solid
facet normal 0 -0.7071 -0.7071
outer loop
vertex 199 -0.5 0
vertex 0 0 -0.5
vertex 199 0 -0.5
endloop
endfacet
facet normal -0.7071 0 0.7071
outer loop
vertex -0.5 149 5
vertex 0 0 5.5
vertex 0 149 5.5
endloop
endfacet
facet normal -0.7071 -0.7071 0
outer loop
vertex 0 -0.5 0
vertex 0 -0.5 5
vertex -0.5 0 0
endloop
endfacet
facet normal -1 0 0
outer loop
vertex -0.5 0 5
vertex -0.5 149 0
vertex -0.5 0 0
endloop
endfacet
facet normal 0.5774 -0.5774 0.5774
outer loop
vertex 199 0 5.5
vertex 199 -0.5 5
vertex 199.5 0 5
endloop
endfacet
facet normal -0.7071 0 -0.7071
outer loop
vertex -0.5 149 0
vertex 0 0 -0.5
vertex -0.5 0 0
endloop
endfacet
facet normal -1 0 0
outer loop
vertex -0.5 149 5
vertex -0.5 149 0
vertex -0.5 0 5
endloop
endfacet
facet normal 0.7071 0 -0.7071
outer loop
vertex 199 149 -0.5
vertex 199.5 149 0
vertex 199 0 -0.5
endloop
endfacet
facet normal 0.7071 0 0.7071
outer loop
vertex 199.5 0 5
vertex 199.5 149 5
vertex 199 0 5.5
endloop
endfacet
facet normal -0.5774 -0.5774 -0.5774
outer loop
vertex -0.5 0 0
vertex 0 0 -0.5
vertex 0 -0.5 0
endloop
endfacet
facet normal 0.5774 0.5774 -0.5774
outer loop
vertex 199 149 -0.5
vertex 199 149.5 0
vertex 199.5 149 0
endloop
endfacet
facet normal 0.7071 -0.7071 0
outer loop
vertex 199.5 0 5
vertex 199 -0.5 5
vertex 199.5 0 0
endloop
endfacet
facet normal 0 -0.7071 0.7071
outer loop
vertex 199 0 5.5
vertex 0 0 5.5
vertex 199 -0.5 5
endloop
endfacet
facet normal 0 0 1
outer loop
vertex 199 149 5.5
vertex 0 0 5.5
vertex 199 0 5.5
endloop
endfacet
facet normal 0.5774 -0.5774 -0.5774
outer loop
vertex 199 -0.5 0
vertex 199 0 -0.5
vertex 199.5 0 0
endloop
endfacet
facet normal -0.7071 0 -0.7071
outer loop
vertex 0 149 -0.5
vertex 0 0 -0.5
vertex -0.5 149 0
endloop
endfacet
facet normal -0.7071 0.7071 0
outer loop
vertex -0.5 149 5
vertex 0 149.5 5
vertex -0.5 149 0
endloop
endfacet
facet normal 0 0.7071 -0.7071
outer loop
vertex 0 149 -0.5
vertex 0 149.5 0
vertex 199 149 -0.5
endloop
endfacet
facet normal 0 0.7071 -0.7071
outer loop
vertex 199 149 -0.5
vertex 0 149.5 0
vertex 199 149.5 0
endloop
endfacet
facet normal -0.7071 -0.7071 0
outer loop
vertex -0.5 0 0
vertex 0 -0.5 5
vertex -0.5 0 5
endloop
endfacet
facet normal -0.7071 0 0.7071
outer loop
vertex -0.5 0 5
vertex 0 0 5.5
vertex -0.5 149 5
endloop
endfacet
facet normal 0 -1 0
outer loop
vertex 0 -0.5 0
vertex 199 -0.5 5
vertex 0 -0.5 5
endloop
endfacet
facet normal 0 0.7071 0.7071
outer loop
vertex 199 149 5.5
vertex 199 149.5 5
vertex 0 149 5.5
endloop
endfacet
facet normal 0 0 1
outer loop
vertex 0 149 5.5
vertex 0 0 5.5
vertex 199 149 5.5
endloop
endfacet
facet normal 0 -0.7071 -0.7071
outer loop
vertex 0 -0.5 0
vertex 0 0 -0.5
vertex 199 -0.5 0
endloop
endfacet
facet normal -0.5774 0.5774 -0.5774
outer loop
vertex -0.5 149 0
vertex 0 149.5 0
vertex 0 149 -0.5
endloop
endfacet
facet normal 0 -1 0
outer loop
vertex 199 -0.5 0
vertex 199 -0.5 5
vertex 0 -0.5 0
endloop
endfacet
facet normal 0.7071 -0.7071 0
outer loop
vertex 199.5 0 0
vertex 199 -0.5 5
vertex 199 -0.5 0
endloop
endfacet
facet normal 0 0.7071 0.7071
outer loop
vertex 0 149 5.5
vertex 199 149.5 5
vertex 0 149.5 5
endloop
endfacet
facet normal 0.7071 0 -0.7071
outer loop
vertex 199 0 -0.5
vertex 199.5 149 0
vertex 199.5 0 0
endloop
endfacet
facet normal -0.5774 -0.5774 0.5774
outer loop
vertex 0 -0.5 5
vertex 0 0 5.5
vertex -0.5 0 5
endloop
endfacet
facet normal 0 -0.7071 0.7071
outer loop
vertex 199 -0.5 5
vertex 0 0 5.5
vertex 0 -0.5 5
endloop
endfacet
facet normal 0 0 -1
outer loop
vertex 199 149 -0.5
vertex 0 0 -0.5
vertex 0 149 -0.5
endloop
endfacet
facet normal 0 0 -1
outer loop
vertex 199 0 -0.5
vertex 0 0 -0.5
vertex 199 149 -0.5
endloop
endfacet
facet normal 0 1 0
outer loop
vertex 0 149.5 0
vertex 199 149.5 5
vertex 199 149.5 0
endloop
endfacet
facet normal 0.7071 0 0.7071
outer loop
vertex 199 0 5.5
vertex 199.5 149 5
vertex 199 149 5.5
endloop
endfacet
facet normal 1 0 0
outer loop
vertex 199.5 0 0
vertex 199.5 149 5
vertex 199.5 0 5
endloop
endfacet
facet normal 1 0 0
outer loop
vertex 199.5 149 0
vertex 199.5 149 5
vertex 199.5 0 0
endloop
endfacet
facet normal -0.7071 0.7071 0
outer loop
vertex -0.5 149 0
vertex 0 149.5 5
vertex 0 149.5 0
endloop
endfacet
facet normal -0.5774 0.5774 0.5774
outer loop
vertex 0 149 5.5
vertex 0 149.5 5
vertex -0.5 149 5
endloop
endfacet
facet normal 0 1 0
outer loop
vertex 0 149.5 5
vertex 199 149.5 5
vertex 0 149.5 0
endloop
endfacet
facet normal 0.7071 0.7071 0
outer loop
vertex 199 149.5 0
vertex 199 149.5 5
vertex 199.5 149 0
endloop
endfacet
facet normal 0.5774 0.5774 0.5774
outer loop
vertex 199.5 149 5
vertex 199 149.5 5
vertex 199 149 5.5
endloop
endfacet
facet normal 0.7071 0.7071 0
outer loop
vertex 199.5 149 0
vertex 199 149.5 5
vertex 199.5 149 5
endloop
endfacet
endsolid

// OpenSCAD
$fn = 64;

length = 200;   // mm
width  = 150;   // mm
thick  = 6;     // mm

// Slight edge break to mimic a tooling plate (small chamfer)
chamfer = 0.5;  // mm

module tooling_plate(L, W, T, c){
    c = min(c, min(L, W)/10, T/2);
    if (c <= 0){
        cube([L, W, T], center=false);
    } else {
        minkowski(){
            cube([L-2*c, W-2*c, T-2*c], center=false);
            octahedron(c);
        }
    }
}

module octahedron(r){
    polyhedron(
        points=[
            [ 0, 0,  r],
            [ r, 0,  0],
            [ 0, r,  0],
            [-r, 0,  0],
            [ 0,-r,  0],
            [ 0, 0, -r]
        ],
        faces=[
            [0,1,2],
            [0,2,3],
            [0,3,4],
            [0,4,1],
            [5,2,1],
            [5,3,2],
            [5,4,3],
            [5,1,4]
        ]
    );
}

color([0.75, 0.78, 0.80])
tooling_plate(length, width, thick, chamfer);
